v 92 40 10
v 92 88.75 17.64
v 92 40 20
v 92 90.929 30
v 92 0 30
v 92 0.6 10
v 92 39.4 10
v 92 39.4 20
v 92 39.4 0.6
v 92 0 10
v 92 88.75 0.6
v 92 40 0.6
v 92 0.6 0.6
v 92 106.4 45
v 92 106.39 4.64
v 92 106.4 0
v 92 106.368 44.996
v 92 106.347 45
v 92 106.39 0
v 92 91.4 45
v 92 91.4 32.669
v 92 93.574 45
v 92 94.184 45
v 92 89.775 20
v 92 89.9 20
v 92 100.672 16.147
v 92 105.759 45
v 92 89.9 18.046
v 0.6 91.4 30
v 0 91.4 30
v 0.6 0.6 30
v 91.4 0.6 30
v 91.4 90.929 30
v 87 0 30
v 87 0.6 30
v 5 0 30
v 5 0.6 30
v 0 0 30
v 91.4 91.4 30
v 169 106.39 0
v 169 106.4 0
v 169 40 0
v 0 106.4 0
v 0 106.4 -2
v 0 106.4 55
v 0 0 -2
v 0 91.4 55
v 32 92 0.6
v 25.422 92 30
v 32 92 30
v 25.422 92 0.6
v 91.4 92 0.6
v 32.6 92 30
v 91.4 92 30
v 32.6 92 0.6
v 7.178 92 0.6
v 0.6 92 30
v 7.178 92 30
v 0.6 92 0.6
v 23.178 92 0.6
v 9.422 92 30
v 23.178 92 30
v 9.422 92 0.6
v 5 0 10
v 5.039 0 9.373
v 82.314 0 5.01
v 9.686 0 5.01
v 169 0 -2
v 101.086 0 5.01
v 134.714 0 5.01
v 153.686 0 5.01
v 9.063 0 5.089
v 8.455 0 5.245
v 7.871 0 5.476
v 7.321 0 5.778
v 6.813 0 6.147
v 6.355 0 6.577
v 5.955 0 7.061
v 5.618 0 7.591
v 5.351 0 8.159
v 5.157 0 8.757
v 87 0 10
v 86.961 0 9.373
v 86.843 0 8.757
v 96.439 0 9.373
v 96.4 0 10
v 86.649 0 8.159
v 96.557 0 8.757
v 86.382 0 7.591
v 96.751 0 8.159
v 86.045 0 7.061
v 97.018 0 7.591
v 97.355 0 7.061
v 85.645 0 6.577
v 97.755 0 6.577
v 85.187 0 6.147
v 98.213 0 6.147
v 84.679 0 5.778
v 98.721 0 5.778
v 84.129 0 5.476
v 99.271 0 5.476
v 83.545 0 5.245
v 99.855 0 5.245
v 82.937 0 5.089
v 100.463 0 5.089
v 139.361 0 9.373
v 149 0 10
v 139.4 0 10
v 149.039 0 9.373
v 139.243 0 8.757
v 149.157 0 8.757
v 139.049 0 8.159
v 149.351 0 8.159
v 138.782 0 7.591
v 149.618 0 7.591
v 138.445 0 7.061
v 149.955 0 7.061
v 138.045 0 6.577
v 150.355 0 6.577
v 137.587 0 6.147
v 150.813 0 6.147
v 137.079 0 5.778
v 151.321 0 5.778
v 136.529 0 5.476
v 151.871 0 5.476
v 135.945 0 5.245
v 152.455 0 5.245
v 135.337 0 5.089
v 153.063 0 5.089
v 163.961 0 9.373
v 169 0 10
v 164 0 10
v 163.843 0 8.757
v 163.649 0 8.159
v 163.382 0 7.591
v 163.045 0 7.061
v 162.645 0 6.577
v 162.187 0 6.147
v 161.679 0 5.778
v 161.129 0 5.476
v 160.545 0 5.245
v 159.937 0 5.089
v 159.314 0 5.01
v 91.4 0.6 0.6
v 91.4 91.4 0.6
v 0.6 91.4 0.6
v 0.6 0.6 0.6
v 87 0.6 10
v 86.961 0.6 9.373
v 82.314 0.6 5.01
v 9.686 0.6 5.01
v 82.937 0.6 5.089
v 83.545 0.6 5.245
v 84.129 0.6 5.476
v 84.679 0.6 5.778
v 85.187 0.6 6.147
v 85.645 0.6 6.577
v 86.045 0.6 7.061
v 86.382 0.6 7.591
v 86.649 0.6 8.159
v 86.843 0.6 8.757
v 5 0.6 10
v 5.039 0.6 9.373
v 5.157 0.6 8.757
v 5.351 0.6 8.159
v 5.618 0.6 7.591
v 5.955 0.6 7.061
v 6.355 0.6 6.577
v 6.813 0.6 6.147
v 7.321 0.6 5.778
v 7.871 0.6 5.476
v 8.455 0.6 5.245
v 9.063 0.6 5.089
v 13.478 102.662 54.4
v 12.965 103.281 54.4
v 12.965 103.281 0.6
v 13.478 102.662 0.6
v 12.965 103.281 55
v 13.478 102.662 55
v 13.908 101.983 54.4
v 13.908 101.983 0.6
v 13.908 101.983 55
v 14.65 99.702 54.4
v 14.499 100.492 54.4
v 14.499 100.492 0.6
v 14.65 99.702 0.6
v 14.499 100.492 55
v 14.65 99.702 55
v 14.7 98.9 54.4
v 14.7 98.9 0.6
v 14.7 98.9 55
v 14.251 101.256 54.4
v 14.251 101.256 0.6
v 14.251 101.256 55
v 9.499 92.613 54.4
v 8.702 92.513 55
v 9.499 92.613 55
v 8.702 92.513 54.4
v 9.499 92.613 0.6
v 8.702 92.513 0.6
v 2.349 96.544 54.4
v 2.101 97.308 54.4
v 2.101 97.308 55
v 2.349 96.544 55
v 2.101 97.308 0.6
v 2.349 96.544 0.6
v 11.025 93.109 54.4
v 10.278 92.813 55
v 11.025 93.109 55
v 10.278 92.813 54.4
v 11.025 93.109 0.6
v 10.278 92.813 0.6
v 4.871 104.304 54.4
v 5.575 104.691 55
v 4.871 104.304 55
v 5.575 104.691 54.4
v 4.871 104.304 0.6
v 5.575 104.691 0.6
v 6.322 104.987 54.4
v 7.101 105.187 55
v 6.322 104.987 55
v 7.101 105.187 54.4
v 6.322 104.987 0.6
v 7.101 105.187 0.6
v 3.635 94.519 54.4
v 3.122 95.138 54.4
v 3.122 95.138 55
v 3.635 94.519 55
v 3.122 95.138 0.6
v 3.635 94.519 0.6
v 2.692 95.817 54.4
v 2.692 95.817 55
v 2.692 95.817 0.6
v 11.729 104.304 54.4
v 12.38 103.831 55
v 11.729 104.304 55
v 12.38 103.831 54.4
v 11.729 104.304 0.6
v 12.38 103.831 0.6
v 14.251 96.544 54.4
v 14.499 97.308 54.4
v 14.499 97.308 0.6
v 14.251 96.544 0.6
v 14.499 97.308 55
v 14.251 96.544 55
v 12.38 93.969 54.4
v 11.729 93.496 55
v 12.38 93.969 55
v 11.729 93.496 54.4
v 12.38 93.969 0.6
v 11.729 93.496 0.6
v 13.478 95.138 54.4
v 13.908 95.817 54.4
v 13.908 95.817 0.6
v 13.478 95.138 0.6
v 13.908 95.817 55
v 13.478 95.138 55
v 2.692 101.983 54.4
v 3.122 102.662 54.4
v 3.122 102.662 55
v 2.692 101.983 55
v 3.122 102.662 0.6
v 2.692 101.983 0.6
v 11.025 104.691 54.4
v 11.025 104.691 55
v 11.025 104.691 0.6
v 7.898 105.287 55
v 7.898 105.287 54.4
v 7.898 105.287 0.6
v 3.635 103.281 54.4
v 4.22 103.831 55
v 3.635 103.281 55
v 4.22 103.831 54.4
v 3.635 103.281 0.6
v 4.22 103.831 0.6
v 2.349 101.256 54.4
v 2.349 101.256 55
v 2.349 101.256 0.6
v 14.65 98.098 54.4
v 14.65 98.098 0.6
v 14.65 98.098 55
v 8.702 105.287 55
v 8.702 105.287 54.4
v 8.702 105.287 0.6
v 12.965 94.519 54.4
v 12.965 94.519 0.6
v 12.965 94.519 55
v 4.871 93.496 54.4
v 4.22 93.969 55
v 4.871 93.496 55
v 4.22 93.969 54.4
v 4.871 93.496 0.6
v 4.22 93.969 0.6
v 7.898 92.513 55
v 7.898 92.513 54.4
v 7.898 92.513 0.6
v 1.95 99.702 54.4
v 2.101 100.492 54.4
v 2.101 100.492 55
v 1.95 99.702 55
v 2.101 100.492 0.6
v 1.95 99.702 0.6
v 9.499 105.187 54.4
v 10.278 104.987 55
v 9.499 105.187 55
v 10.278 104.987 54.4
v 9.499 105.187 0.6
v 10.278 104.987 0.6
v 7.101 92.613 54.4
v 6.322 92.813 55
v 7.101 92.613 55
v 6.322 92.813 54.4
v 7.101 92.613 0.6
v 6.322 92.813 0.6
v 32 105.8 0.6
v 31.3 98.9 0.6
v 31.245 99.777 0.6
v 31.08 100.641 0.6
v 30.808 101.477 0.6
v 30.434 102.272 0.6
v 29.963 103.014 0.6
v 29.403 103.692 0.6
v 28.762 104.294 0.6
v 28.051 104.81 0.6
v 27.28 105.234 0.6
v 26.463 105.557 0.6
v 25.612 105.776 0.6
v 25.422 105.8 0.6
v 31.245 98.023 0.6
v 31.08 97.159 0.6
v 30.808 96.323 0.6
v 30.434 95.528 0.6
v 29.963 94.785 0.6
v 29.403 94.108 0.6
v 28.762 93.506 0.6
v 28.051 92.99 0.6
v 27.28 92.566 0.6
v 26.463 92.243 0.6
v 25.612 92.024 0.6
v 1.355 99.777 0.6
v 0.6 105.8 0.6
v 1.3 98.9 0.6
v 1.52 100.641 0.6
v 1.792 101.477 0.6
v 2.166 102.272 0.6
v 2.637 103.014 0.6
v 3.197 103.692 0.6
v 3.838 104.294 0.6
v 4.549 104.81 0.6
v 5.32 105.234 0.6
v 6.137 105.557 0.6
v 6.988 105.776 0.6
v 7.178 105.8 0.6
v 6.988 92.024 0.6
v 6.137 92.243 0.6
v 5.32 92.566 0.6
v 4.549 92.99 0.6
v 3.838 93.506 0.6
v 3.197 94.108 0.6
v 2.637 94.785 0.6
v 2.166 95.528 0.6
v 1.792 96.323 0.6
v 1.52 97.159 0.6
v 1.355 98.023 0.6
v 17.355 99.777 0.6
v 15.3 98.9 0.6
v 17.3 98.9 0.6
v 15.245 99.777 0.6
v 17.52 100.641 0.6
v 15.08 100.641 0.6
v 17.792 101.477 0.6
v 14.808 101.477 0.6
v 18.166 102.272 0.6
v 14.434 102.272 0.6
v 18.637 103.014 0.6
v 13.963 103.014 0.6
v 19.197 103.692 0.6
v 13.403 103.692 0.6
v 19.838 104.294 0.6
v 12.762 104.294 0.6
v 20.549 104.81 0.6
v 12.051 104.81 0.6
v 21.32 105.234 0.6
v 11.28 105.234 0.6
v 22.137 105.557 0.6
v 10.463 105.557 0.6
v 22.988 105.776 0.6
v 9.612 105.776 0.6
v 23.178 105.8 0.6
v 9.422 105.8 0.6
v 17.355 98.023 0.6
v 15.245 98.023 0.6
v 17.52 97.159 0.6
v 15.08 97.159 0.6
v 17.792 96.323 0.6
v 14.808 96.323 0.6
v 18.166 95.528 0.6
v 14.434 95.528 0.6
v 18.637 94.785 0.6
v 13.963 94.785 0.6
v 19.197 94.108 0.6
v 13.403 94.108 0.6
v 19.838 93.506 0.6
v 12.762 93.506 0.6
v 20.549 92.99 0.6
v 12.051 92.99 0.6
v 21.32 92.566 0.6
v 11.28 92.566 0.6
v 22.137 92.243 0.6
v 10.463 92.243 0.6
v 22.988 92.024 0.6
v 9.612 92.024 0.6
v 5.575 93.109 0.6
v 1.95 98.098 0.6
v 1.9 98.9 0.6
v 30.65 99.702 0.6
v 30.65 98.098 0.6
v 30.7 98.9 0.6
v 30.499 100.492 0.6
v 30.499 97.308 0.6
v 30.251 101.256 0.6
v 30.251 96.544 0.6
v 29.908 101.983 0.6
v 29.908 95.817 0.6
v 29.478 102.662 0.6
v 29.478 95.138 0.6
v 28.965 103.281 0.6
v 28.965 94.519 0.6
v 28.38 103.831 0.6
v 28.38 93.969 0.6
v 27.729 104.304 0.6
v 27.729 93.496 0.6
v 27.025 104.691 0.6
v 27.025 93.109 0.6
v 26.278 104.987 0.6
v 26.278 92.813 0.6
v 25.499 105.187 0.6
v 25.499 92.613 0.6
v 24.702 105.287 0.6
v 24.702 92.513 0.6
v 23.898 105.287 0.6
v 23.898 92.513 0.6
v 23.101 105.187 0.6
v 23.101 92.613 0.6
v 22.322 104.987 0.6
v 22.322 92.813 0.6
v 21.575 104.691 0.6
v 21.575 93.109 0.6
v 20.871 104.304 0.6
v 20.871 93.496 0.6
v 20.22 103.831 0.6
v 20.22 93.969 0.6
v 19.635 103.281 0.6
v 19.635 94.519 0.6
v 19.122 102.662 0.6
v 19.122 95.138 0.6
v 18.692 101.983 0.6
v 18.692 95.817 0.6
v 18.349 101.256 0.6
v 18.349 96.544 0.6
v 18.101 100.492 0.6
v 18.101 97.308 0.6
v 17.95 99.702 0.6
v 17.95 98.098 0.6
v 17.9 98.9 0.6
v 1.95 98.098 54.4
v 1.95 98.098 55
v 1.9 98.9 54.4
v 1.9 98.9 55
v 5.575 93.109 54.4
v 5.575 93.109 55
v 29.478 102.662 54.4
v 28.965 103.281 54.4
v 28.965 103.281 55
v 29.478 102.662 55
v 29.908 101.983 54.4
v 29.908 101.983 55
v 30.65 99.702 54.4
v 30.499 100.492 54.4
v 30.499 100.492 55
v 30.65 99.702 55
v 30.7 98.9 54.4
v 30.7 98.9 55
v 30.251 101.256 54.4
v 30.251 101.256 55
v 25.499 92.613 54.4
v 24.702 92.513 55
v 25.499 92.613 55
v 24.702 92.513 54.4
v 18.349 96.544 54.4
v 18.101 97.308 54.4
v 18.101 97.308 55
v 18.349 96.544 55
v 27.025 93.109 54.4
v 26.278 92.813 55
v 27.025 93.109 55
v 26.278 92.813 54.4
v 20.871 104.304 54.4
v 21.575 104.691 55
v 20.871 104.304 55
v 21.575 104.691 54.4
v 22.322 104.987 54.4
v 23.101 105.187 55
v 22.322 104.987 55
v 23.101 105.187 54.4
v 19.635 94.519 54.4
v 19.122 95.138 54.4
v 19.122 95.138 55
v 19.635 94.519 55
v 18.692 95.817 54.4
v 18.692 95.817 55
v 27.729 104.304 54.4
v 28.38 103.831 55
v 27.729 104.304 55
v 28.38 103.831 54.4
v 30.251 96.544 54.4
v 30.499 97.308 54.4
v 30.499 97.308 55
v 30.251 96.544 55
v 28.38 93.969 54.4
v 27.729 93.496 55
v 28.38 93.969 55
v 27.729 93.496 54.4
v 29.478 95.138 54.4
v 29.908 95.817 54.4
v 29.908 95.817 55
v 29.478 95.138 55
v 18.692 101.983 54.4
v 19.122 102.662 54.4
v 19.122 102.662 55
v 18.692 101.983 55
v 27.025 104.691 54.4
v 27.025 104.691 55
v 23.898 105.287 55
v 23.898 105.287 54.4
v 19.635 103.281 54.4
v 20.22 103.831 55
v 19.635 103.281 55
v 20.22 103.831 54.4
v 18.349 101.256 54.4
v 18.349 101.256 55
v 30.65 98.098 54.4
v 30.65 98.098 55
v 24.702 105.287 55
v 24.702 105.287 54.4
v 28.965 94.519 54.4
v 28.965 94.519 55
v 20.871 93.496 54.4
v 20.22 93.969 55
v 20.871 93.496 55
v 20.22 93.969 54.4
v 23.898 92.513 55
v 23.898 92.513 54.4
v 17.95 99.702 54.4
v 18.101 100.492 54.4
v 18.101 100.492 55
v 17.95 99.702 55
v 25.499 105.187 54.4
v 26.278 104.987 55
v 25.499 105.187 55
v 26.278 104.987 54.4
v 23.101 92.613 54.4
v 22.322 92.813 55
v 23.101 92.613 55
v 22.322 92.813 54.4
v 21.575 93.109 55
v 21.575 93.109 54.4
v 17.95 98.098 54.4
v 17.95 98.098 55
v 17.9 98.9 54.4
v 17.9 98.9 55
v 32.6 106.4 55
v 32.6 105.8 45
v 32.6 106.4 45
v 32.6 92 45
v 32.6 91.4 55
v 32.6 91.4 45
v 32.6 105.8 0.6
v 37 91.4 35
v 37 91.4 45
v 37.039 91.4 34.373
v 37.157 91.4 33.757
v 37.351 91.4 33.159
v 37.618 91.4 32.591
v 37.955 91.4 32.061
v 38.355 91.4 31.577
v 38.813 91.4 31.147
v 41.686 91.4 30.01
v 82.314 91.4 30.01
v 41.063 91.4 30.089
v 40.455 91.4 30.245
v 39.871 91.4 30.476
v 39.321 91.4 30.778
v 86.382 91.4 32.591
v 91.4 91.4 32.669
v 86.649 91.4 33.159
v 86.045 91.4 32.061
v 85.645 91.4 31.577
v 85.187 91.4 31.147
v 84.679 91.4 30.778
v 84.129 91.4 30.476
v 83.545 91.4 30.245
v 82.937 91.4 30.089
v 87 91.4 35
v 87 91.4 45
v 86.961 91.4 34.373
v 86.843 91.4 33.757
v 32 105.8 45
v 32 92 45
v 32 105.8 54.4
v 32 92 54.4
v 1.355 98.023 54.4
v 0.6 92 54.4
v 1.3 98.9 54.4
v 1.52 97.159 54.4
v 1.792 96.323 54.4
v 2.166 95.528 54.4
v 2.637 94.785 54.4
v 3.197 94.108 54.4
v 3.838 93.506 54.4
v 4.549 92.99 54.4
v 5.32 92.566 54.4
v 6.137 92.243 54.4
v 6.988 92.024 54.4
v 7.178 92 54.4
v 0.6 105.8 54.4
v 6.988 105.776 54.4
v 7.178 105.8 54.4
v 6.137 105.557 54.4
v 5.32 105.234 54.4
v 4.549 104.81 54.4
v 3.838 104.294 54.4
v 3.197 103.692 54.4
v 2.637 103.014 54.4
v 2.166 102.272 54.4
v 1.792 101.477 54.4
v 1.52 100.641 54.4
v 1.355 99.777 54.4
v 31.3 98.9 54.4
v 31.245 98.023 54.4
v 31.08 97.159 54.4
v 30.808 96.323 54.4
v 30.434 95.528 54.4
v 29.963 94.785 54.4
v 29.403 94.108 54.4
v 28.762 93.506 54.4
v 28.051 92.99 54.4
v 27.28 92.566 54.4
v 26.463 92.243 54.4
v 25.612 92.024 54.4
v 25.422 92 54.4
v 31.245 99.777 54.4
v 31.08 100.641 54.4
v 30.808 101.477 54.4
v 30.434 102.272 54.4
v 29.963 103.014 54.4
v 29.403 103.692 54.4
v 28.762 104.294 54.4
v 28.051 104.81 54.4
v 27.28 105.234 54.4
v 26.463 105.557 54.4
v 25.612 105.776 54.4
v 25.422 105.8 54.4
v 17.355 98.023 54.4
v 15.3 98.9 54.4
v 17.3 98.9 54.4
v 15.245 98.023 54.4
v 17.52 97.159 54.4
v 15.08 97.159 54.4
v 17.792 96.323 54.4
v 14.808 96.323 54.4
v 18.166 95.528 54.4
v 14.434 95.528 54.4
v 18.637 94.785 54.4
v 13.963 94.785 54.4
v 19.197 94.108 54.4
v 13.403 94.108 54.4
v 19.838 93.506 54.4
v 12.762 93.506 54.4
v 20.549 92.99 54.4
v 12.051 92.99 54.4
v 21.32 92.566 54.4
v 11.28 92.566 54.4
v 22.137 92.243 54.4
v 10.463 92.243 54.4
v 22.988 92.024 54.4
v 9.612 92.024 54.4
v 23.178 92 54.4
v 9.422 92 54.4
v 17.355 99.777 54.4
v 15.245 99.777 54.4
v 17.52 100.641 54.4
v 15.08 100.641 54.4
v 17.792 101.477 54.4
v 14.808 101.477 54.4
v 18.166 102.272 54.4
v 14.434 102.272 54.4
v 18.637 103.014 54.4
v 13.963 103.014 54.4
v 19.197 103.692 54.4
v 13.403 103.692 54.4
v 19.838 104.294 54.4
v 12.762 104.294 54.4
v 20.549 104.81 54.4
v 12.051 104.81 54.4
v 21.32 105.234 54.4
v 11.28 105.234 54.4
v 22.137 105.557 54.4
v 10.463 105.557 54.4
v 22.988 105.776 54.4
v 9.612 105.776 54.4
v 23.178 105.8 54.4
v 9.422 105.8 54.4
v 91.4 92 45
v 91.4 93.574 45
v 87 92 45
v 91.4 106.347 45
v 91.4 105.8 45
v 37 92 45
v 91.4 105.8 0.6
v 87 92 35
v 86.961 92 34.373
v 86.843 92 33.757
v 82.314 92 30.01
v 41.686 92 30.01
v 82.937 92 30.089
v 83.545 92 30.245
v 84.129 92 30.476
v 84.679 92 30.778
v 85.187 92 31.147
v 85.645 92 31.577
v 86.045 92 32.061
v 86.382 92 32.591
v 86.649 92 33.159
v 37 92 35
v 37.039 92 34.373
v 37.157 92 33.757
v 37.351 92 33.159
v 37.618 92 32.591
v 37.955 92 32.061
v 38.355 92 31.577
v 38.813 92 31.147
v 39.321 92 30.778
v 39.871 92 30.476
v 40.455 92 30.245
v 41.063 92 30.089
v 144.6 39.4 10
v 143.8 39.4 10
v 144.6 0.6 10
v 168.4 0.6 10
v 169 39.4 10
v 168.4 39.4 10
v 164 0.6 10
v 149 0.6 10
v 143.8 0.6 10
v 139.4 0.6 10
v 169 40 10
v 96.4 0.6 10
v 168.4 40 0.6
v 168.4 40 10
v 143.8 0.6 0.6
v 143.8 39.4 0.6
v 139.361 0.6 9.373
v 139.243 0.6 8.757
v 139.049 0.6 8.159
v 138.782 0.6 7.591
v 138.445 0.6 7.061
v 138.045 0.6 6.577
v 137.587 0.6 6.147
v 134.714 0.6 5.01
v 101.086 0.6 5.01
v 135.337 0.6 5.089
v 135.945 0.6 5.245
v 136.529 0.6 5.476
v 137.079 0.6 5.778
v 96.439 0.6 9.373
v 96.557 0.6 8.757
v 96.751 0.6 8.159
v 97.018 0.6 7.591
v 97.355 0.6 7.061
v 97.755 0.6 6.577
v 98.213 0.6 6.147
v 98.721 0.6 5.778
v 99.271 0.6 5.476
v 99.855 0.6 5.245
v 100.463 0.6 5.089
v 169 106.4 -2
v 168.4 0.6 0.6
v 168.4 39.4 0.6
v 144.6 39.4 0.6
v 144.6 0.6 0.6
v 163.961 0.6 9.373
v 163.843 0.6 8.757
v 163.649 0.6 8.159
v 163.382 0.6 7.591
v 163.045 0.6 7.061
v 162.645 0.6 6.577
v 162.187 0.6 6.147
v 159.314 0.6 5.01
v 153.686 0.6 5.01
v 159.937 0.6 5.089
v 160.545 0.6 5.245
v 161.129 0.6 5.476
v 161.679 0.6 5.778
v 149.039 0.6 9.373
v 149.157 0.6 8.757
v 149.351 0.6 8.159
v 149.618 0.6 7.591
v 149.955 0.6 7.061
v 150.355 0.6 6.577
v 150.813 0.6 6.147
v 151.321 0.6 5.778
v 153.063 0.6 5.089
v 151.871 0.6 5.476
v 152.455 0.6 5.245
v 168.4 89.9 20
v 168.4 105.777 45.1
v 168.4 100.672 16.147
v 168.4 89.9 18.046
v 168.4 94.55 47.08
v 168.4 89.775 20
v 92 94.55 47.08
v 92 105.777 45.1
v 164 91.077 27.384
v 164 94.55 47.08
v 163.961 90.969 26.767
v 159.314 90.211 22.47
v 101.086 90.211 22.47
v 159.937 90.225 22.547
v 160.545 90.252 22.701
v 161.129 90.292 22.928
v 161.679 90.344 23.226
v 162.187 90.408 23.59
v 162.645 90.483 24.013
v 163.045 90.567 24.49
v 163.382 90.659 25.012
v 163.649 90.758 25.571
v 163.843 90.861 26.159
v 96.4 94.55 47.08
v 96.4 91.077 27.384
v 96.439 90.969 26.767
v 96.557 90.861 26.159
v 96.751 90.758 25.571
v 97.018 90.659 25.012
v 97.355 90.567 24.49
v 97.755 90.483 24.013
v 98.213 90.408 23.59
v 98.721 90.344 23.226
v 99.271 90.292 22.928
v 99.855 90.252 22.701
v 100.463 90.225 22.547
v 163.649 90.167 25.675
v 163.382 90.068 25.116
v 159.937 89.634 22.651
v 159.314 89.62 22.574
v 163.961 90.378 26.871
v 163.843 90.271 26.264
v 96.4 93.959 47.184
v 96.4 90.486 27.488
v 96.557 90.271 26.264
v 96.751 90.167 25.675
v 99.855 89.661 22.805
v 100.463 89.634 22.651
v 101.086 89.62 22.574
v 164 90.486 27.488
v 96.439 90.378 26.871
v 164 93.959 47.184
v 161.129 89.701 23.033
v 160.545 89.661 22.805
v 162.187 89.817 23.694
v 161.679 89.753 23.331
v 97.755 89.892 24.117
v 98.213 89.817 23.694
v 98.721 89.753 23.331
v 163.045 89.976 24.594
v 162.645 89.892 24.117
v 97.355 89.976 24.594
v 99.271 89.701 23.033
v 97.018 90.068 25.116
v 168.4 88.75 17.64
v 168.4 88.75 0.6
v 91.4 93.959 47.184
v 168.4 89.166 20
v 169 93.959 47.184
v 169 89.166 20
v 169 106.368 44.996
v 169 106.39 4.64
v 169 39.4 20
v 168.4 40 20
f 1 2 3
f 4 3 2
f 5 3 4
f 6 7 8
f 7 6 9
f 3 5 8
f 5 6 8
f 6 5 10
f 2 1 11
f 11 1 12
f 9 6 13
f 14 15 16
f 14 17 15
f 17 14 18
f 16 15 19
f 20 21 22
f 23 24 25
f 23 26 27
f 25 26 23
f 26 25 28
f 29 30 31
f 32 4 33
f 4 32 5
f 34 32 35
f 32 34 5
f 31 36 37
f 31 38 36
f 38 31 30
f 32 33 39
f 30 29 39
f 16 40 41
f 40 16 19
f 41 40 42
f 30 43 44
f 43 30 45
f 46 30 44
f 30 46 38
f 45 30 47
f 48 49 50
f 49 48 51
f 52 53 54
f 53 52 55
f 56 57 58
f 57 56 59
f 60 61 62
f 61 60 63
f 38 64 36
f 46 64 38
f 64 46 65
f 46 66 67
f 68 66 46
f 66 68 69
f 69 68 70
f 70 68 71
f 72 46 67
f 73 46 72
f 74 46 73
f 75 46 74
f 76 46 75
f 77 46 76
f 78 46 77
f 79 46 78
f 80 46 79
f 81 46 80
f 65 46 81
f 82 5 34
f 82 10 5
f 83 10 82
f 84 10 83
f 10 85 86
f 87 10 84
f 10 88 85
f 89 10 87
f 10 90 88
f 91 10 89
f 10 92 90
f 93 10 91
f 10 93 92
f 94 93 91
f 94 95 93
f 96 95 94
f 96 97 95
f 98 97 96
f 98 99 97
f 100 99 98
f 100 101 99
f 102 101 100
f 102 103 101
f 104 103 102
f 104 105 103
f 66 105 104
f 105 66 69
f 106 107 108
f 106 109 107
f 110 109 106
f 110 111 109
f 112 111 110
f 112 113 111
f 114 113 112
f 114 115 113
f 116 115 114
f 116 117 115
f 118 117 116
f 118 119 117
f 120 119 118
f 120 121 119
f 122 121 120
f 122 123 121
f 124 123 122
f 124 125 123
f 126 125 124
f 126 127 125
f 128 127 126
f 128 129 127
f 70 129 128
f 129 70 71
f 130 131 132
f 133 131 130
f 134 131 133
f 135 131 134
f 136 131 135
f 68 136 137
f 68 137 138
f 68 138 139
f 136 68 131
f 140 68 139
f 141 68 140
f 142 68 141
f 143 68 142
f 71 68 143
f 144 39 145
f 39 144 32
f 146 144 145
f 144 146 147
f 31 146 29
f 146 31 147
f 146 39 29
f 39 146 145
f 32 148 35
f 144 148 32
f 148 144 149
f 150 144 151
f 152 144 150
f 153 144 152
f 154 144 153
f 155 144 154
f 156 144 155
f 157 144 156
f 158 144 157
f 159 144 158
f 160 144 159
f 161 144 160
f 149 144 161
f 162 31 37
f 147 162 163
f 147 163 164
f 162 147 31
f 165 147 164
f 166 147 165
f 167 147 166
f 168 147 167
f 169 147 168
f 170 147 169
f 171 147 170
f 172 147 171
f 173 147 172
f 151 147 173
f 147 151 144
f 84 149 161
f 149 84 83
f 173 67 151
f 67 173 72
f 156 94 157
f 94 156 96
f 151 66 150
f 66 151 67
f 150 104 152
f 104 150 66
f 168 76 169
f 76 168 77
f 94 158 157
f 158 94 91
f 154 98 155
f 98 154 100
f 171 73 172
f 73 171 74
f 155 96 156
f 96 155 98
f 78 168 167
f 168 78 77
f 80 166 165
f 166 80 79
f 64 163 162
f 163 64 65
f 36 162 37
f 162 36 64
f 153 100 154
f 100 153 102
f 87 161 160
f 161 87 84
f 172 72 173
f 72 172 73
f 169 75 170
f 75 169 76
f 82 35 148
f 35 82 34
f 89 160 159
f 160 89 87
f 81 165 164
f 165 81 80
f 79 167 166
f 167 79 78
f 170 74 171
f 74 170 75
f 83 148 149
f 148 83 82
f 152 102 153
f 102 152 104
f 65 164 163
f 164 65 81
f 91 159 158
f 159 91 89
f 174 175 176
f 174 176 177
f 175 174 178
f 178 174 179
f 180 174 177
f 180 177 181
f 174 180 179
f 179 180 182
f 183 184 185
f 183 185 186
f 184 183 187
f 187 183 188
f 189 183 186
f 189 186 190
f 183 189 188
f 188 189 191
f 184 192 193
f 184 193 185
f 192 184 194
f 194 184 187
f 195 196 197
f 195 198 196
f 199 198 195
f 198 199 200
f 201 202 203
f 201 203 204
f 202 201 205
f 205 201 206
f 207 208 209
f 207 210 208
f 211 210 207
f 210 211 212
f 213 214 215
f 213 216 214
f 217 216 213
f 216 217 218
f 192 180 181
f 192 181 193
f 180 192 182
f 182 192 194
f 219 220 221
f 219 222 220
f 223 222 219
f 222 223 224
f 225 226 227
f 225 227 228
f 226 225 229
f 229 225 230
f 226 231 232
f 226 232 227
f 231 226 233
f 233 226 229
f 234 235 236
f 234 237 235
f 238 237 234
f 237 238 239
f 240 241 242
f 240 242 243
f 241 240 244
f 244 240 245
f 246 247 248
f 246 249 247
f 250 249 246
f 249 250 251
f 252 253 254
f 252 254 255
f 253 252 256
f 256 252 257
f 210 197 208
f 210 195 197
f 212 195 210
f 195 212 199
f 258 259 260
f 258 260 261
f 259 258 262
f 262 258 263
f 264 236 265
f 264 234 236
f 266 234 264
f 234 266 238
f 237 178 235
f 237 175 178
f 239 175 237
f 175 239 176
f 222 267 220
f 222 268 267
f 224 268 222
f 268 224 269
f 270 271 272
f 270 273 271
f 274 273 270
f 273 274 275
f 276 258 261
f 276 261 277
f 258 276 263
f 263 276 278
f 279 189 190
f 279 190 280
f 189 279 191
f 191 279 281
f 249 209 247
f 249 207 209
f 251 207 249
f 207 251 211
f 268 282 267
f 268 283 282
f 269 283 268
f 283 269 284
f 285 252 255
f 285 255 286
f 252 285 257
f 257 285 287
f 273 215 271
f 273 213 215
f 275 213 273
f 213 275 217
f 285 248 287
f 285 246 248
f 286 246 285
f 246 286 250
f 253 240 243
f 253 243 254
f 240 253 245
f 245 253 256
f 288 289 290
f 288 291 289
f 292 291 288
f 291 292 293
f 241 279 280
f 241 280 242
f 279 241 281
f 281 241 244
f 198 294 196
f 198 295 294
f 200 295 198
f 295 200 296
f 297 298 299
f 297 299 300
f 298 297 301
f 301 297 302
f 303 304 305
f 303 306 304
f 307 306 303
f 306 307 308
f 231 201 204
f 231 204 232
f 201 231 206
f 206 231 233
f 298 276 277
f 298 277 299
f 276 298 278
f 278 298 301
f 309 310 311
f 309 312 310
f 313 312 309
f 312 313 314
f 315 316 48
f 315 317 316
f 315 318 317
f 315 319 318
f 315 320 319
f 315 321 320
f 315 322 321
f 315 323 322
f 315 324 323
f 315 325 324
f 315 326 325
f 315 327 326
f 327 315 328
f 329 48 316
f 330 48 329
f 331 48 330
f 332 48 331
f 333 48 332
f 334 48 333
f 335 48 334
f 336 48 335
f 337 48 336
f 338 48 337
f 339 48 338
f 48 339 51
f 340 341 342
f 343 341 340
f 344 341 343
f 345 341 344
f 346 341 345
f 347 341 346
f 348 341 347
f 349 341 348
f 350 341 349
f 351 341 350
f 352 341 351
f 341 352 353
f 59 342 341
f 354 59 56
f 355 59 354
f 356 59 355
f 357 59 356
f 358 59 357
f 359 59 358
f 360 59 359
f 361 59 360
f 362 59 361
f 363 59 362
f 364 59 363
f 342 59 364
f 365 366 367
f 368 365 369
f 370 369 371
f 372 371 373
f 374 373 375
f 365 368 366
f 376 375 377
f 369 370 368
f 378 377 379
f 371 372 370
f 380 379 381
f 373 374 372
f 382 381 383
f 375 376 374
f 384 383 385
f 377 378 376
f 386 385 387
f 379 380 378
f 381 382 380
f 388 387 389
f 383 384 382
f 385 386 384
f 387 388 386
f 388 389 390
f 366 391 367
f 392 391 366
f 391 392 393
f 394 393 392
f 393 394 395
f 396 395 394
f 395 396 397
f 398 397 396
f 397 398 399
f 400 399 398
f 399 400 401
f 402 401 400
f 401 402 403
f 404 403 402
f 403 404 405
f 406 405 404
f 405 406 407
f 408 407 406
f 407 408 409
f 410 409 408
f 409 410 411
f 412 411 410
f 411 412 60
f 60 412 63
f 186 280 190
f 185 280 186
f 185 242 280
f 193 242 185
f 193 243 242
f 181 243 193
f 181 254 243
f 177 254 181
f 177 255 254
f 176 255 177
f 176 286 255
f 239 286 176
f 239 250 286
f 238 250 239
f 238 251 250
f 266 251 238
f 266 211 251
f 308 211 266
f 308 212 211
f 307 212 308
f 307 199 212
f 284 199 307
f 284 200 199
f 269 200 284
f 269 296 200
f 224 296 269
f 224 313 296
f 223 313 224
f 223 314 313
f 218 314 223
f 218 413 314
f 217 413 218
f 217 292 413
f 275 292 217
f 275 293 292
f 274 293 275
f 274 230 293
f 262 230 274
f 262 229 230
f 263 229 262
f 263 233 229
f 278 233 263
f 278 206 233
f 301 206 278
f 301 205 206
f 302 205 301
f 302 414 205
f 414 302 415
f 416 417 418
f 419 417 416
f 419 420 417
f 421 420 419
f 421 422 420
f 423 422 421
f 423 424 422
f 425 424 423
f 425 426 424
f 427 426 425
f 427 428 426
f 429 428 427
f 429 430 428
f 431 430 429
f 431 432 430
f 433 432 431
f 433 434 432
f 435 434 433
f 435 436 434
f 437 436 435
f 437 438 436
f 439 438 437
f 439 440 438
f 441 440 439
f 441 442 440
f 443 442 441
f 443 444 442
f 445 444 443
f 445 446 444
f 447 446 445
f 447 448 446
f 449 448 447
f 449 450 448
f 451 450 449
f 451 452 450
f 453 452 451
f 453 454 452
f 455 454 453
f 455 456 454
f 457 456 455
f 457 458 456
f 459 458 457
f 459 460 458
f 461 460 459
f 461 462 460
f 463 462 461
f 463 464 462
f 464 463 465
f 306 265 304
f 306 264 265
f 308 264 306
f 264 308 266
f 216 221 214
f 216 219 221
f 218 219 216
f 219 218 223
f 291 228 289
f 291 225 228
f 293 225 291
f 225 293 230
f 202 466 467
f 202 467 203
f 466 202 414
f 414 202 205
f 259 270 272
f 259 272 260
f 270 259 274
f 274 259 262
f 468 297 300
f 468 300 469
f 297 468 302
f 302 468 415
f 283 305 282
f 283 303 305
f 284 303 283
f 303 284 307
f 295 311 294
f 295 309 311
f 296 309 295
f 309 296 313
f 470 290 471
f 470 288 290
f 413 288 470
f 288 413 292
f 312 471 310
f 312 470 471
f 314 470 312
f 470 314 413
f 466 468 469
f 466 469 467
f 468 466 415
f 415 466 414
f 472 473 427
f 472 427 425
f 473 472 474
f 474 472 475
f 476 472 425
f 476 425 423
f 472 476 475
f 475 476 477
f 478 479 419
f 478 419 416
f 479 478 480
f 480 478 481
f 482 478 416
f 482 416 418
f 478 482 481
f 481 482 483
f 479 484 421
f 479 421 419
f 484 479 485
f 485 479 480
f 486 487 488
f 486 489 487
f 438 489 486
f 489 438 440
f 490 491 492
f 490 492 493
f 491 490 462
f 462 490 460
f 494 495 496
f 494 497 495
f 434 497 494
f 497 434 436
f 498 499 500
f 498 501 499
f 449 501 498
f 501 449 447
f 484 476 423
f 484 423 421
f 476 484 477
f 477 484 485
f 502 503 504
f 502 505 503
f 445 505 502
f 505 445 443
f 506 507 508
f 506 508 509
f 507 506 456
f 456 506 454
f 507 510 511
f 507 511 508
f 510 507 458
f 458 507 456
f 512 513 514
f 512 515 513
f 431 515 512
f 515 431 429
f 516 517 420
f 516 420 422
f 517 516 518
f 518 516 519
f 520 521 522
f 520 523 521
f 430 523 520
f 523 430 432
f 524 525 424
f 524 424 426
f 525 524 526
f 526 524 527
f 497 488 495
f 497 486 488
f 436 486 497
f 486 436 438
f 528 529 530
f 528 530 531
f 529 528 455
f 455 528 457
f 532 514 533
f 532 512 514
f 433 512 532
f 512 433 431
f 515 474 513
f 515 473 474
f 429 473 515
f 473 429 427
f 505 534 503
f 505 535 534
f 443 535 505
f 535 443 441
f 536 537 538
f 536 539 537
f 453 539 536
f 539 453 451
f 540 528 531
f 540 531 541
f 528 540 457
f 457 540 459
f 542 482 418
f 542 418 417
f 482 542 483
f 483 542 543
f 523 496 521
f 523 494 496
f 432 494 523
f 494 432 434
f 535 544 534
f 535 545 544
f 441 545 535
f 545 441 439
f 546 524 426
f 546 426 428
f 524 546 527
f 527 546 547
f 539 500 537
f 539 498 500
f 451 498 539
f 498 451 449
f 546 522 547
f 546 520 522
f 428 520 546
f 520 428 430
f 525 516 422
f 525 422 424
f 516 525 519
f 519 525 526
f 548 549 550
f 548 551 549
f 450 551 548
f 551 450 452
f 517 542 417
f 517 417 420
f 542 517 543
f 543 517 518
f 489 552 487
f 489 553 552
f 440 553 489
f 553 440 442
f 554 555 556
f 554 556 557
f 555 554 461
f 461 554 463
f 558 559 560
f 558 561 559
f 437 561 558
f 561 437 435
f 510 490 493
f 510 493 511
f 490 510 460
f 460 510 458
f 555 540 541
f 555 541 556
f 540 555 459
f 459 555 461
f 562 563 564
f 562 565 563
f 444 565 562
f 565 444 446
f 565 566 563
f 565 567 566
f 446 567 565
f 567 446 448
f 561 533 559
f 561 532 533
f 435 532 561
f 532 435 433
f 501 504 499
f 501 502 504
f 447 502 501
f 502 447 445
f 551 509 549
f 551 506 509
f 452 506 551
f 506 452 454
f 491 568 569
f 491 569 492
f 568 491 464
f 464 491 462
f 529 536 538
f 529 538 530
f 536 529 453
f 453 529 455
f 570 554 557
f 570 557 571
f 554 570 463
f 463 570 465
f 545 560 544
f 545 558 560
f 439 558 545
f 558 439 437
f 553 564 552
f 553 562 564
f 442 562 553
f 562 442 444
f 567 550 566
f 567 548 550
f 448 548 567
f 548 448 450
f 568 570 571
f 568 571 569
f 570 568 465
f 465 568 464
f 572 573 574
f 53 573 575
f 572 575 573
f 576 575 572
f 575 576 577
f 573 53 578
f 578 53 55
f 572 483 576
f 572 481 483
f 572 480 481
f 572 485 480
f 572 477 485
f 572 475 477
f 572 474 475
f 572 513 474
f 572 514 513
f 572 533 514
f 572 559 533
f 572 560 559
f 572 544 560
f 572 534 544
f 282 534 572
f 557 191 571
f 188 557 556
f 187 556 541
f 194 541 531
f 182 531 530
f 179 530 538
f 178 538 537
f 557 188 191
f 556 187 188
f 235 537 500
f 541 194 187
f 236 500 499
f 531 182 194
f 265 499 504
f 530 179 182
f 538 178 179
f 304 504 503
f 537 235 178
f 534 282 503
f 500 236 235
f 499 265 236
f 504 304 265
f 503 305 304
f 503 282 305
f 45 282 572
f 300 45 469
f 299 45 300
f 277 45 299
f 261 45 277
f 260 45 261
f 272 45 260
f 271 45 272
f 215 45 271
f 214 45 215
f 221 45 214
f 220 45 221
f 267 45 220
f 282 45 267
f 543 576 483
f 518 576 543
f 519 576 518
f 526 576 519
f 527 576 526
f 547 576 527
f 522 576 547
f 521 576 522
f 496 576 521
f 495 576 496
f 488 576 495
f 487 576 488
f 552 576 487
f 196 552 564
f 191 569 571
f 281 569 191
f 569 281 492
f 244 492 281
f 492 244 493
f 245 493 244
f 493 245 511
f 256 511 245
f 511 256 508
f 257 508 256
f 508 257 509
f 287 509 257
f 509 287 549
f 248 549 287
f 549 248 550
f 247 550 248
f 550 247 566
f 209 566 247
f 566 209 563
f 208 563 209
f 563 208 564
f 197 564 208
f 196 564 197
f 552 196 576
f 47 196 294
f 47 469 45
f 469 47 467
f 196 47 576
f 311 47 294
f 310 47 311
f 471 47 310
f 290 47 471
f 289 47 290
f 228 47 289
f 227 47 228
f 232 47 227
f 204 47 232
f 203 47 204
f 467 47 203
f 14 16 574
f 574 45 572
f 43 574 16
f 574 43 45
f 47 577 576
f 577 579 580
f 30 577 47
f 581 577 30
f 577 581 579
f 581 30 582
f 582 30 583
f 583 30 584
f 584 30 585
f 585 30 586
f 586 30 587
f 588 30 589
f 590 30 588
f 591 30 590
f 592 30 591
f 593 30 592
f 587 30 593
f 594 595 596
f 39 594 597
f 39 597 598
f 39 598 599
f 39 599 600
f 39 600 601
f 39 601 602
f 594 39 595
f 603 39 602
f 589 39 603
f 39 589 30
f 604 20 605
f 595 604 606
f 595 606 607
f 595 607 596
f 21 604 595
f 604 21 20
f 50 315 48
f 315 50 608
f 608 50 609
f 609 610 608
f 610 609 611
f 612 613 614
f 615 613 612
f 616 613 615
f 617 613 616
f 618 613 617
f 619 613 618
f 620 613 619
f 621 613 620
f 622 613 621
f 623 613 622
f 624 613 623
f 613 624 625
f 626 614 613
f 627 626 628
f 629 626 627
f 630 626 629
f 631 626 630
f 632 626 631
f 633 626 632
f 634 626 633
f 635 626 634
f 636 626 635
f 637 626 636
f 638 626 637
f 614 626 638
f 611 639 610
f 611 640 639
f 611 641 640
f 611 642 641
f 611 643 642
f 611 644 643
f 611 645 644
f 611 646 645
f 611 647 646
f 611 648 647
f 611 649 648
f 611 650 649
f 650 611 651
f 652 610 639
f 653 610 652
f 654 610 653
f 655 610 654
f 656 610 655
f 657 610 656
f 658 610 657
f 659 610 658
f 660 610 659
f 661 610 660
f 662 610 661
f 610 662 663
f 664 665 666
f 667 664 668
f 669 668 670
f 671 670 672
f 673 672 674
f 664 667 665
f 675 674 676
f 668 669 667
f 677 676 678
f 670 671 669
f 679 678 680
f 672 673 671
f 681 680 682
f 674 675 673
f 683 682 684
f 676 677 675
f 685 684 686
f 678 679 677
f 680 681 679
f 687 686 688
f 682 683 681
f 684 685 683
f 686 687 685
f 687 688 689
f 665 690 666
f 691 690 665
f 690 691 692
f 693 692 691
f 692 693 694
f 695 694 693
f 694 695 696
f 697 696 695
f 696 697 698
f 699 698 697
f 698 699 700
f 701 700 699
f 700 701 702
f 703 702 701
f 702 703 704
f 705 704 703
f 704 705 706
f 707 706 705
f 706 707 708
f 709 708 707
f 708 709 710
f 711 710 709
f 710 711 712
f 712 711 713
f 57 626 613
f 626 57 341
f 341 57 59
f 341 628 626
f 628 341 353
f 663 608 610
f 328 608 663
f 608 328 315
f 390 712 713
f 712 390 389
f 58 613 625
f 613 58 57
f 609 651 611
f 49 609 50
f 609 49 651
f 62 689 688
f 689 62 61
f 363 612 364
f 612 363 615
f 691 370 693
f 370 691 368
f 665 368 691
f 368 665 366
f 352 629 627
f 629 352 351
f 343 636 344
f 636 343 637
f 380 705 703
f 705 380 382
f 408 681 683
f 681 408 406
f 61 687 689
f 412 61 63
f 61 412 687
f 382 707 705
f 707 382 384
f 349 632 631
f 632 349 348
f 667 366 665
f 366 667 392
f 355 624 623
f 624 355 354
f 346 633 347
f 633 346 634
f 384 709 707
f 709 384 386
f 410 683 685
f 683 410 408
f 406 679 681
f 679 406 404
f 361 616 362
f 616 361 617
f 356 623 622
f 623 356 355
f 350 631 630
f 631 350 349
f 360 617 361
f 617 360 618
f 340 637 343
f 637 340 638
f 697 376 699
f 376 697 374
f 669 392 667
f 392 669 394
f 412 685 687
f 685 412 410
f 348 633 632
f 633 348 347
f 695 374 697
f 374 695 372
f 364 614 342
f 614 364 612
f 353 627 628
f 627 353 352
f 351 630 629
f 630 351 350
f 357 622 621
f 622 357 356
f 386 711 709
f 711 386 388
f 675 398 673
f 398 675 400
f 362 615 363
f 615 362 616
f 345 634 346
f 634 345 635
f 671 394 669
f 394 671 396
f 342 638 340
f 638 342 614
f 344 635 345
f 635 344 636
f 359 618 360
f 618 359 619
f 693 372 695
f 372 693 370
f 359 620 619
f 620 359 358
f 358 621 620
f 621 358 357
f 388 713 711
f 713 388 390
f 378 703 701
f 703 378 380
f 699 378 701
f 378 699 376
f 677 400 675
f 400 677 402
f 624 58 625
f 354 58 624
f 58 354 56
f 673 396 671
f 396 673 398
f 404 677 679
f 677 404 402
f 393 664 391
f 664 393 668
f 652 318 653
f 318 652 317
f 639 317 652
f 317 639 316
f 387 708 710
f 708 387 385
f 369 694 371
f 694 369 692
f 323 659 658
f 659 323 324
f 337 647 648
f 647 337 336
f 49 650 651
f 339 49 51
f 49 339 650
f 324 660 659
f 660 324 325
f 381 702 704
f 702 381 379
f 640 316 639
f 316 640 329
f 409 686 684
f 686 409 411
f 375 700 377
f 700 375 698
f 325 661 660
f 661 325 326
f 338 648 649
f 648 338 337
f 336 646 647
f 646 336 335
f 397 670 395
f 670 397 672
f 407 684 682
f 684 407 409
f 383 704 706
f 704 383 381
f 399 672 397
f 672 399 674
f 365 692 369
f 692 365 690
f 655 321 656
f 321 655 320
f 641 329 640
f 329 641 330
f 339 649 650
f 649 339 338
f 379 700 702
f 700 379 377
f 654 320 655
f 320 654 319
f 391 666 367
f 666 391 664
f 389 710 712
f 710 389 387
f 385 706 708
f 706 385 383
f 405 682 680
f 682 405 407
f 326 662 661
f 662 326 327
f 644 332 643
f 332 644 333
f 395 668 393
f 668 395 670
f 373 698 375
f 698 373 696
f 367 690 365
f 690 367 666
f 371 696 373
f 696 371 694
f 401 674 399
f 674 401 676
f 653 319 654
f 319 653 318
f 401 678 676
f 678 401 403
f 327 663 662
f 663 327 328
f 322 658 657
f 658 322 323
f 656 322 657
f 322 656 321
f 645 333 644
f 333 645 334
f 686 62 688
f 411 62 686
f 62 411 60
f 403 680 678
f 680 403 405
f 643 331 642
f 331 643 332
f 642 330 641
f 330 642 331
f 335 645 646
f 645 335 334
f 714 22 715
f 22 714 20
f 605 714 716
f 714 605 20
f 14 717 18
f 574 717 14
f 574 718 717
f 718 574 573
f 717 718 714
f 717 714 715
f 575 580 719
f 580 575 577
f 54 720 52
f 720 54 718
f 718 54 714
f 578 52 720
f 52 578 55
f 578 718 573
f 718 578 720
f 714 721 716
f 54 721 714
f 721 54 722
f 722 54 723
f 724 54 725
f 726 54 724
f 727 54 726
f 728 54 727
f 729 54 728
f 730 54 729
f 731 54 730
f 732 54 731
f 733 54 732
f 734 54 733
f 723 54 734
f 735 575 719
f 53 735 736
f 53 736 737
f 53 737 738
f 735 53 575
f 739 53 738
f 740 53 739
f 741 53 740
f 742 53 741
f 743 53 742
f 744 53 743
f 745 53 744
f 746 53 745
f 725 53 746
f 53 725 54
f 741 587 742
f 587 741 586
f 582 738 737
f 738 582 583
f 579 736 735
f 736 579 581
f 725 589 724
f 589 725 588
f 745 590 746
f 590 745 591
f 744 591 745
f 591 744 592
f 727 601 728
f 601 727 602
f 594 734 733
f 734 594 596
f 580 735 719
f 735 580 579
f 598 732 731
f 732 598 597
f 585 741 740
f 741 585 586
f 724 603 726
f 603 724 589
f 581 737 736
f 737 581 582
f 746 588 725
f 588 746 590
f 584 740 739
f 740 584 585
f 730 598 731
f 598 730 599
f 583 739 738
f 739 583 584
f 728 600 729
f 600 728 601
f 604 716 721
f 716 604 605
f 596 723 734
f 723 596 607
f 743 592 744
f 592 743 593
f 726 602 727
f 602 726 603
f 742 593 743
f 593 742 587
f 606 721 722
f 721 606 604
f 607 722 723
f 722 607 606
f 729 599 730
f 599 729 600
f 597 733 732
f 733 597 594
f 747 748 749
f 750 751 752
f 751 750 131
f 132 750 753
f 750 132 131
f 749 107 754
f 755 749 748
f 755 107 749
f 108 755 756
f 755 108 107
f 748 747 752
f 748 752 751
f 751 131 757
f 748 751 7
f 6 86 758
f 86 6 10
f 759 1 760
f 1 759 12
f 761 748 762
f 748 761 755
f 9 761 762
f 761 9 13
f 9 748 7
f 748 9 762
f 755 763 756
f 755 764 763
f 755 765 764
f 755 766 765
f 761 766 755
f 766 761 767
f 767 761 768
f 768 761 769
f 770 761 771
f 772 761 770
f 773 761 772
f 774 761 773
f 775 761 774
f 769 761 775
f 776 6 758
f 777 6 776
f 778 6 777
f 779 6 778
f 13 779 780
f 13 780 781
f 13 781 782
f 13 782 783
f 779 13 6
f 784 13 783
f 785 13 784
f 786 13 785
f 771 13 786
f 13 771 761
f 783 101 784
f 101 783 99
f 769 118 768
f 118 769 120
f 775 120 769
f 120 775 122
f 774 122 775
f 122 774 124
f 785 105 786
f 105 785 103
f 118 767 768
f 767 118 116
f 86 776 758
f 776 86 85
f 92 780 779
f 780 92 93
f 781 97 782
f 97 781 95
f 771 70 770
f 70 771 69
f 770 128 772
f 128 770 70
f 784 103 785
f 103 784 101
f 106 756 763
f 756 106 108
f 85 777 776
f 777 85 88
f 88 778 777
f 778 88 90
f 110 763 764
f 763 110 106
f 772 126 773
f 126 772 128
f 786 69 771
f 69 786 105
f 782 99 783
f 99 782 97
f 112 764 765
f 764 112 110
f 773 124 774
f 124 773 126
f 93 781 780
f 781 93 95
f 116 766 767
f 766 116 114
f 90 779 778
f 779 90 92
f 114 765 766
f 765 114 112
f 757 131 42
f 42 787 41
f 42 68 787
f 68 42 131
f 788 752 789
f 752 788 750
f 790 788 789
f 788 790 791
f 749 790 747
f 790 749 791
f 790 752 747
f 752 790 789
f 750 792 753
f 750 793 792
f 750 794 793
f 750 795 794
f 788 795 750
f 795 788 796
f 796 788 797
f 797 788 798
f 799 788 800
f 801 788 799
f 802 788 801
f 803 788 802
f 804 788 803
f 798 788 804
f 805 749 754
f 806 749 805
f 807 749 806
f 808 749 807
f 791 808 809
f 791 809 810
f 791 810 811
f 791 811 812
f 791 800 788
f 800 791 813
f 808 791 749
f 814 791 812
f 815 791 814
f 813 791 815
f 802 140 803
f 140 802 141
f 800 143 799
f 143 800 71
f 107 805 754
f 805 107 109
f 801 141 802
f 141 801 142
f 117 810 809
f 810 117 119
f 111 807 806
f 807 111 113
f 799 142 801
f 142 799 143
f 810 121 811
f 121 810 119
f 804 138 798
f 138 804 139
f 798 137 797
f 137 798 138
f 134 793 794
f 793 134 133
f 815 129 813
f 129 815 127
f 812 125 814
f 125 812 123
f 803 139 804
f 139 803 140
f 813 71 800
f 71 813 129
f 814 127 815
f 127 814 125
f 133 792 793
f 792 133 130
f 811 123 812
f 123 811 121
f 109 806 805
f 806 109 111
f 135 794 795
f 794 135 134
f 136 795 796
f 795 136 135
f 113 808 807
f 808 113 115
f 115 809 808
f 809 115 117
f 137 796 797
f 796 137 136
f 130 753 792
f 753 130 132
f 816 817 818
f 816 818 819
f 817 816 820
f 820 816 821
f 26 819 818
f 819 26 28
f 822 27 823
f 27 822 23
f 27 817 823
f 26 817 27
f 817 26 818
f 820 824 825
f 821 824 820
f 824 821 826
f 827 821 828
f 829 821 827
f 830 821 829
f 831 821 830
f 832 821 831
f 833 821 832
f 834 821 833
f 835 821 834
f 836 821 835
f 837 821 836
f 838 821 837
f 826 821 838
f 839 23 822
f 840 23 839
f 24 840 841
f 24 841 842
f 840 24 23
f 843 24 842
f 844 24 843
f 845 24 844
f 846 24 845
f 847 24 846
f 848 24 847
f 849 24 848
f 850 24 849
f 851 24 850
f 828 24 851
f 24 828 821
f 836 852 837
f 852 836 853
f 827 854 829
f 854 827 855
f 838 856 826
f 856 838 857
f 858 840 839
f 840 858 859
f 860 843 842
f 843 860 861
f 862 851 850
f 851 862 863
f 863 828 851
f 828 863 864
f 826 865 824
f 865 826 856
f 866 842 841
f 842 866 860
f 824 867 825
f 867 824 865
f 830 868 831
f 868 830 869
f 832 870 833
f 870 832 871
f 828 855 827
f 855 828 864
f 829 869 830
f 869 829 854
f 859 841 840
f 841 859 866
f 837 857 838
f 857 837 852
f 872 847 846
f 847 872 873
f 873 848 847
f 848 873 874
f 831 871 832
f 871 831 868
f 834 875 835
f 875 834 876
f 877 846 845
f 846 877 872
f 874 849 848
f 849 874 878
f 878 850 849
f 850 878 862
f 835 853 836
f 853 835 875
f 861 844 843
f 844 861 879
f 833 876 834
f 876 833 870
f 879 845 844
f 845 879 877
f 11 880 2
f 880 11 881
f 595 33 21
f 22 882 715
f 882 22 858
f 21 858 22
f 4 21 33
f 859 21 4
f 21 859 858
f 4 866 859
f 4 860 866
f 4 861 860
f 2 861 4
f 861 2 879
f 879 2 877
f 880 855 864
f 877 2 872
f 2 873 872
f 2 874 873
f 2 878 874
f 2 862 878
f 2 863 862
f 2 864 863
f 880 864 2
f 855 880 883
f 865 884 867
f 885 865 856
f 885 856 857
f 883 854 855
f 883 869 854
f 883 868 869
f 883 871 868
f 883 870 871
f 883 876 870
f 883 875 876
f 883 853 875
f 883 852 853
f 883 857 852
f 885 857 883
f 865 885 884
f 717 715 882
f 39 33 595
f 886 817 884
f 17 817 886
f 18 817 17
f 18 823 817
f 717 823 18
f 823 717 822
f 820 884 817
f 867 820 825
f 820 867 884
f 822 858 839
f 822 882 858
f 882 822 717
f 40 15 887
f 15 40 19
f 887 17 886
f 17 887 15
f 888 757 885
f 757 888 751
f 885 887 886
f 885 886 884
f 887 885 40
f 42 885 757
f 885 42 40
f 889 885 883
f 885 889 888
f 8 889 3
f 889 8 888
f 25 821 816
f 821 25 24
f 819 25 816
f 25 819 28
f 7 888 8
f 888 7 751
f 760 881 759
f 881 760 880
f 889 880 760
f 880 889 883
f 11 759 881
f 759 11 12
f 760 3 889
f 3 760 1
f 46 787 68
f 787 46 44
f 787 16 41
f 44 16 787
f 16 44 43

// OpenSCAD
$fn = 50;
thickness = 0.6;
roundness = 5;
cover=5;


module box(size = [56, 15, 90], thickness = thickness, cover=cover, center = false) {
  x = size[0];
  y = size[1];
  z = size[2];
  t = thickness;
  dt = thickness * 2;

  difference() {
    cube([x, y, z]);
    translate([t, t, t])
      cube([x - dt, y - dt, z]);
  }
}
module open_box(size = [56, 15, 90], thickness = thickness, cover=cover, center = false, hole_start=cover) {
  x = size[0];
  y = size[1];
  z = size[2];
  t = thickness;
  dt = thickness * 2;
  ht = thickness / 2;
  cov = cover + roundness;
  hstart = hole_start + roundness;
  hcov = cov / 2;
  dcov = cov * 2;

  difference() {
    box([x, y, z])
    translate([t, t, t])
      cube([x - dt, y - dt, z]);

    rotate(90, [1, 0, 0])
      translate([cov, hstart, -t-ht])
        hull() {
          cylinder(dt, r=roundness);
          translate([x - dcov, 0, 0])
            cylinder(dt, r=roundness);
          translate([x - dcov, z, 0])
            cylinder(dt, r=roundness);
          translate([0,z,0])
            cylinder(dt, r=roundness);
        }
  }
}

module pen_holder(size = [56, 15, 90], hole = 10, space = 10, thickness = thickness, cover=cover, center = false) {
  x = size[0];
  y = size[1];
  z = size[2];
  t = thickness;
  dt = thickness * 2;
  rhole = hole / 2;

  hole_no = floor(x / (hole + space));
  margin = (x - (((hole + space) * hole_no) - space)) / 2;

  difference() {
    cube([x, y, z]);
    translate([t, t, t])
      cube([x - dt, y - dt, z-dt]);

    for (offset_ = [0 : space + hole : x - hole - space]) {
      translate([margin + rhole + offset_, y / 2, t])
        cylinder(z, r=rhole - t);
    }
  }

  difference() {
    union() {
      for (offset_ = [0 : space + hole : x - hole - space]) {
        translate([margin + rhole + offset_, y / 2, t])
          cylinder(z-t, r=rhole);
      }
    }
    for (offset_ = [0 : space + hole : x - hole - space]) {
      translate([margin + rhole + offset_, y / 2, t])
        cylinder(z, r=rhole - t);
    }
  }
}

module business_card_holder(size = [56, 15, 90], thickness = thickness, cover=cover, center = false, hole_start=cover) {
  x = size[0];
  y = size[1];
  z = size[2];
  open_box([x, y, z], hole_start=hole_start);
}

module paper_holder(size = [90, 90, 40], thickness = thickness, cover=cover, center = false) {
  x = size[0];
  y = size[1];
  z = size[2];
  open_box([x, y, z]);
}

module phone_holder(height = 15, angle = -10, width = 20) {
  x = 77 + thickness;
  y = 12.6;
  z = 30;
  t = thickness;
  dt = thickness * 2;
  ht = thickness / 2;
  cov = cover + roundness;
  hstart = cover + roundness;
  hcov = cov / 2;
  dcov = cov * 2;

  difference() {
    hull() {
      rotate(angle, [1, 0, 0])
      box([x, y, z]);
      translate([0, 0, - height])
        cube([x, width, 5]);
    }
    rotate(angle, [1, 0, 0]) {
        translate([t, t, t])
          cube([x - dt, y - dt, z]);
        rotate(90, [1, 0, 0])
          translate([cov, hstart, -t-ht])
            hull() {
              cylinder(dt, r=roundness);
              translate([x - dcov, 0, 0])
                cylinder(dt, r=roundness);
              translate([x - dcov, z, 0])
                cylinder(dt, r=roundness);
              translate([0,z,0])
                cylinder(dt, r=roundness);
            }
    }
  }
}

module usbsdholder(size = [90, 35, 15], deep=10) {
  x = size[0];
  y = size[1];
  z = size[2];
  module block(size = size) {
    x = size[0];
    y = size[1];
    z = size[2];
    dr = roundness * 2;
    hull() {
        translate([0, y - roundness, z - roundness])
          rotate(90, [0,1,0])
            cylinder(x - roundness, r=roundness);
        translate([x - roundness, 0, z - roundness])
          rotate(90, [-1,0,0])
            cylinder(y - roundness, r=roundness);
        translate([x - roundness, y - roundness, z - roundness])
          sphere(roundness);
        cube([x, y, z - roundness]);
        translate([0, 0, roundness])
          cube([x/2, y/2, z-roundness]);
      }
  }
  module usb(size = [5, 12.5, 10]) {
    cube(size);
  }
  module sd(size = [2.5, 24.5, 10]) {
    x = size[0];
    y = size[1];
    z = size[2];
    cube(size);
    translate([x/2, 0, 0]) {
      cylinder(z, r=x);
      translate([0, y, 0])
        cylinder(z, r=x);
    }
  }
  module microsd(size = [1.1, 11.5, 10]) {
    x = size[0];
    y = size[1];
    z = size[2];
    cube(size);
    translate([x/2, 0, 0]) {
      cylinder(z, r=x);
      translate([0, y, 0])
        cylinder(z, r=x);
    }
  }

  layer = 0.2;

  difference() {
    block();
    translate([5, 11, (z - deep) + layer]) {
      usb();
      translate([1.2, -6, 0])
        sd();
      translate([8.2, 2, 0])
        rotate(90, [0,0,1])
          microsd();
    }
  }
}

/* !usbsdholder(); */

paper_holder([92, 92, 30]);
translate([0, 92 - thickness, 0])
  pen_holder([32+thickness, 15, 55], hole=14, space=2);

translate([32, 92 - thickness, 0])
  business_card_holder([60, 15, 45], hole=11, space=2, hole_start=30);

translate([92 - thickness, 0, 0])
  open_box([53, 40, 10], hole=11, space=2);

translate([144, 0, 0])
  open_box([25, 40, 10], hole=11, space=2);

translate([92 - thickness, 88.75, 17.64])
  phone_holder(height=18, width=17.64);

translate([92 - thickness, 40-thickness, 0])
  box([77+thickness, 50.5, 20], hole=11, space=2);

translate([0, 0, -2])
  cube([169, 107 - thickness ,2]);



/* #translate([92, 0.4, 0]) */
  /* cube([52, 40, 5]); */
